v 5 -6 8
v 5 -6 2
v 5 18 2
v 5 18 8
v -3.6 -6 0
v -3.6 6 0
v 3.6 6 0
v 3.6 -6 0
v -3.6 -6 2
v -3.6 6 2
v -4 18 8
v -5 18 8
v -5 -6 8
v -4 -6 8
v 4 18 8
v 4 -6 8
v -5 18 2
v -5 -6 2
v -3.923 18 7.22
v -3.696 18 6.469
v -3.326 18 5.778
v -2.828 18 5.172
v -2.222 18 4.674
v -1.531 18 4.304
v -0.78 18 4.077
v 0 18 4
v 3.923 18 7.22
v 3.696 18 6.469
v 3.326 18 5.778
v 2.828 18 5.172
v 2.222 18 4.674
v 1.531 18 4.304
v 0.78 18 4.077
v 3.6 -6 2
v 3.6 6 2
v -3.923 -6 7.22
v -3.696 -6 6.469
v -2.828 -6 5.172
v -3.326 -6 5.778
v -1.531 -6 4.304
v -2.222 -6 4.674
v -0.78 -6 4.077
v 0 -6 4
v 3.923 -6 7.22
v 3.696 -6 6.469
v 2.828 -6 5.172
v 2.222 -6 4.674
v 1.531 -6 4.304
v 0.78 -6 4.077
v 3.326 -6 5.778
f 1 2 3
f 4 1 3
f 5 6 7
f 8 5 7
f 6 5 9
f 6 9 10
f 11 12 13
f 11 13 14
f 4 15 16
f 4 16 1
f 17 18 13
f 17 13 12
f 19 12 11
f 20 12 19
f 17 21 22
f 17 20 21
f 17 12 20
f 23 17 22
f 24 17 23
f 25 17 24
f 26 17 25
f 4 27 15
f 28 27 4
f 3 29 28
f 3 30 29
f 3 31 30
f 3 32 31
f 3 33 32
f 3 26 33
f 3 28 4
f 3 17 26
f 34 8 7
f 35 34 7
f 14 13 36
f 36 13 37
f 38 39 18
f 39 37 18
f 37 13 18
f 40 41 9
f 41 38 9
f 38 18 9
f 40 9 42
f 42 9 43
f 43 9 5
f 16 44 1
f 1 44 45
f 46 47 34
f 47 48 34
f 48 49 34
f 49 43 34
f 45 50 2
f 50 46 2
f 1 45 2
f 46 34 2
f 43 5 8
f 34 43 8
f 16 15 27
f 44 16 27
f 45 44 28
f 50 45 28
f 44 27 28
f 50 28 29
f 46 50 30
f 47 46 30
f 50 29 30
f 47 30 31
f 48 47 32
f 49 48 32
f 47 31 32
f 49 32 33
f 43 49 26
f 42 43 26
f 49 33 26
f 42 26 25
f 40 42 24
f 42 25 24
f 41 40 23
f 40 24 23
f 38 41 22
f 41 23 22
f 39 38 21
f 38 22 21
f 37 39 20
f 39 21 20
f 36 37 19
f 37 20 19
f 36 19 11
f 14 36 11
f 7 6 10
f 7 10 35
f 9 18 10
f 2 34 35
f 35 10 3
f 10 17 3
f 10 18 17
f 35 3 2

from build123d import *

# Parameters (mm, degrees)
SKETCH1_W           = 7.2
SKETCH1_H           = 12
BOSS_EXTRUDE1_DEPTH = 2
SKETCH2_W           = 10
SKETCH2_H           = 24
BOSS_EXTRUDE2_DEPTH = 6
CUT_EXTRUDE1_DEPTH  = 24


with BuildPart() as part:
    # Sketch1 → Boss-Extrude1 (new body)
    with BuildSketch(Plane.XY):
        Rectangle(SKETCH1_W, SKETCH1_H)
    extrude(amount=BOSS_EXTRUDE1_DEPTH)

    # Sketch2 → Boss-Extrude2 (add)
    with BuildSketch(Plane.XY.offset(2)):
        with Locations((0, 6)):
            Rectangle(SKETCH2_W, SKETCH2_H)
    extrude(amount=BOSS_EXTRUDE2_DEPTH)

    # Sketch5 → Cut-Extrude1 (cut)
    with BuildSketch(Plane(origin=(0, 18, 0), x_dir=(1, 0, 0), z_dir=(0, 1, 0))):
        with BuildLine():
            Line((-4, -8), (4, -8))
            ThreePointArc((4, -8), (0, -4), (-4, -8))
        make_face()
    extrude(amount=-CUT_EXTRUDE1_DEPTH, mode=Mode.SUBTRACT)


solid = part.part
